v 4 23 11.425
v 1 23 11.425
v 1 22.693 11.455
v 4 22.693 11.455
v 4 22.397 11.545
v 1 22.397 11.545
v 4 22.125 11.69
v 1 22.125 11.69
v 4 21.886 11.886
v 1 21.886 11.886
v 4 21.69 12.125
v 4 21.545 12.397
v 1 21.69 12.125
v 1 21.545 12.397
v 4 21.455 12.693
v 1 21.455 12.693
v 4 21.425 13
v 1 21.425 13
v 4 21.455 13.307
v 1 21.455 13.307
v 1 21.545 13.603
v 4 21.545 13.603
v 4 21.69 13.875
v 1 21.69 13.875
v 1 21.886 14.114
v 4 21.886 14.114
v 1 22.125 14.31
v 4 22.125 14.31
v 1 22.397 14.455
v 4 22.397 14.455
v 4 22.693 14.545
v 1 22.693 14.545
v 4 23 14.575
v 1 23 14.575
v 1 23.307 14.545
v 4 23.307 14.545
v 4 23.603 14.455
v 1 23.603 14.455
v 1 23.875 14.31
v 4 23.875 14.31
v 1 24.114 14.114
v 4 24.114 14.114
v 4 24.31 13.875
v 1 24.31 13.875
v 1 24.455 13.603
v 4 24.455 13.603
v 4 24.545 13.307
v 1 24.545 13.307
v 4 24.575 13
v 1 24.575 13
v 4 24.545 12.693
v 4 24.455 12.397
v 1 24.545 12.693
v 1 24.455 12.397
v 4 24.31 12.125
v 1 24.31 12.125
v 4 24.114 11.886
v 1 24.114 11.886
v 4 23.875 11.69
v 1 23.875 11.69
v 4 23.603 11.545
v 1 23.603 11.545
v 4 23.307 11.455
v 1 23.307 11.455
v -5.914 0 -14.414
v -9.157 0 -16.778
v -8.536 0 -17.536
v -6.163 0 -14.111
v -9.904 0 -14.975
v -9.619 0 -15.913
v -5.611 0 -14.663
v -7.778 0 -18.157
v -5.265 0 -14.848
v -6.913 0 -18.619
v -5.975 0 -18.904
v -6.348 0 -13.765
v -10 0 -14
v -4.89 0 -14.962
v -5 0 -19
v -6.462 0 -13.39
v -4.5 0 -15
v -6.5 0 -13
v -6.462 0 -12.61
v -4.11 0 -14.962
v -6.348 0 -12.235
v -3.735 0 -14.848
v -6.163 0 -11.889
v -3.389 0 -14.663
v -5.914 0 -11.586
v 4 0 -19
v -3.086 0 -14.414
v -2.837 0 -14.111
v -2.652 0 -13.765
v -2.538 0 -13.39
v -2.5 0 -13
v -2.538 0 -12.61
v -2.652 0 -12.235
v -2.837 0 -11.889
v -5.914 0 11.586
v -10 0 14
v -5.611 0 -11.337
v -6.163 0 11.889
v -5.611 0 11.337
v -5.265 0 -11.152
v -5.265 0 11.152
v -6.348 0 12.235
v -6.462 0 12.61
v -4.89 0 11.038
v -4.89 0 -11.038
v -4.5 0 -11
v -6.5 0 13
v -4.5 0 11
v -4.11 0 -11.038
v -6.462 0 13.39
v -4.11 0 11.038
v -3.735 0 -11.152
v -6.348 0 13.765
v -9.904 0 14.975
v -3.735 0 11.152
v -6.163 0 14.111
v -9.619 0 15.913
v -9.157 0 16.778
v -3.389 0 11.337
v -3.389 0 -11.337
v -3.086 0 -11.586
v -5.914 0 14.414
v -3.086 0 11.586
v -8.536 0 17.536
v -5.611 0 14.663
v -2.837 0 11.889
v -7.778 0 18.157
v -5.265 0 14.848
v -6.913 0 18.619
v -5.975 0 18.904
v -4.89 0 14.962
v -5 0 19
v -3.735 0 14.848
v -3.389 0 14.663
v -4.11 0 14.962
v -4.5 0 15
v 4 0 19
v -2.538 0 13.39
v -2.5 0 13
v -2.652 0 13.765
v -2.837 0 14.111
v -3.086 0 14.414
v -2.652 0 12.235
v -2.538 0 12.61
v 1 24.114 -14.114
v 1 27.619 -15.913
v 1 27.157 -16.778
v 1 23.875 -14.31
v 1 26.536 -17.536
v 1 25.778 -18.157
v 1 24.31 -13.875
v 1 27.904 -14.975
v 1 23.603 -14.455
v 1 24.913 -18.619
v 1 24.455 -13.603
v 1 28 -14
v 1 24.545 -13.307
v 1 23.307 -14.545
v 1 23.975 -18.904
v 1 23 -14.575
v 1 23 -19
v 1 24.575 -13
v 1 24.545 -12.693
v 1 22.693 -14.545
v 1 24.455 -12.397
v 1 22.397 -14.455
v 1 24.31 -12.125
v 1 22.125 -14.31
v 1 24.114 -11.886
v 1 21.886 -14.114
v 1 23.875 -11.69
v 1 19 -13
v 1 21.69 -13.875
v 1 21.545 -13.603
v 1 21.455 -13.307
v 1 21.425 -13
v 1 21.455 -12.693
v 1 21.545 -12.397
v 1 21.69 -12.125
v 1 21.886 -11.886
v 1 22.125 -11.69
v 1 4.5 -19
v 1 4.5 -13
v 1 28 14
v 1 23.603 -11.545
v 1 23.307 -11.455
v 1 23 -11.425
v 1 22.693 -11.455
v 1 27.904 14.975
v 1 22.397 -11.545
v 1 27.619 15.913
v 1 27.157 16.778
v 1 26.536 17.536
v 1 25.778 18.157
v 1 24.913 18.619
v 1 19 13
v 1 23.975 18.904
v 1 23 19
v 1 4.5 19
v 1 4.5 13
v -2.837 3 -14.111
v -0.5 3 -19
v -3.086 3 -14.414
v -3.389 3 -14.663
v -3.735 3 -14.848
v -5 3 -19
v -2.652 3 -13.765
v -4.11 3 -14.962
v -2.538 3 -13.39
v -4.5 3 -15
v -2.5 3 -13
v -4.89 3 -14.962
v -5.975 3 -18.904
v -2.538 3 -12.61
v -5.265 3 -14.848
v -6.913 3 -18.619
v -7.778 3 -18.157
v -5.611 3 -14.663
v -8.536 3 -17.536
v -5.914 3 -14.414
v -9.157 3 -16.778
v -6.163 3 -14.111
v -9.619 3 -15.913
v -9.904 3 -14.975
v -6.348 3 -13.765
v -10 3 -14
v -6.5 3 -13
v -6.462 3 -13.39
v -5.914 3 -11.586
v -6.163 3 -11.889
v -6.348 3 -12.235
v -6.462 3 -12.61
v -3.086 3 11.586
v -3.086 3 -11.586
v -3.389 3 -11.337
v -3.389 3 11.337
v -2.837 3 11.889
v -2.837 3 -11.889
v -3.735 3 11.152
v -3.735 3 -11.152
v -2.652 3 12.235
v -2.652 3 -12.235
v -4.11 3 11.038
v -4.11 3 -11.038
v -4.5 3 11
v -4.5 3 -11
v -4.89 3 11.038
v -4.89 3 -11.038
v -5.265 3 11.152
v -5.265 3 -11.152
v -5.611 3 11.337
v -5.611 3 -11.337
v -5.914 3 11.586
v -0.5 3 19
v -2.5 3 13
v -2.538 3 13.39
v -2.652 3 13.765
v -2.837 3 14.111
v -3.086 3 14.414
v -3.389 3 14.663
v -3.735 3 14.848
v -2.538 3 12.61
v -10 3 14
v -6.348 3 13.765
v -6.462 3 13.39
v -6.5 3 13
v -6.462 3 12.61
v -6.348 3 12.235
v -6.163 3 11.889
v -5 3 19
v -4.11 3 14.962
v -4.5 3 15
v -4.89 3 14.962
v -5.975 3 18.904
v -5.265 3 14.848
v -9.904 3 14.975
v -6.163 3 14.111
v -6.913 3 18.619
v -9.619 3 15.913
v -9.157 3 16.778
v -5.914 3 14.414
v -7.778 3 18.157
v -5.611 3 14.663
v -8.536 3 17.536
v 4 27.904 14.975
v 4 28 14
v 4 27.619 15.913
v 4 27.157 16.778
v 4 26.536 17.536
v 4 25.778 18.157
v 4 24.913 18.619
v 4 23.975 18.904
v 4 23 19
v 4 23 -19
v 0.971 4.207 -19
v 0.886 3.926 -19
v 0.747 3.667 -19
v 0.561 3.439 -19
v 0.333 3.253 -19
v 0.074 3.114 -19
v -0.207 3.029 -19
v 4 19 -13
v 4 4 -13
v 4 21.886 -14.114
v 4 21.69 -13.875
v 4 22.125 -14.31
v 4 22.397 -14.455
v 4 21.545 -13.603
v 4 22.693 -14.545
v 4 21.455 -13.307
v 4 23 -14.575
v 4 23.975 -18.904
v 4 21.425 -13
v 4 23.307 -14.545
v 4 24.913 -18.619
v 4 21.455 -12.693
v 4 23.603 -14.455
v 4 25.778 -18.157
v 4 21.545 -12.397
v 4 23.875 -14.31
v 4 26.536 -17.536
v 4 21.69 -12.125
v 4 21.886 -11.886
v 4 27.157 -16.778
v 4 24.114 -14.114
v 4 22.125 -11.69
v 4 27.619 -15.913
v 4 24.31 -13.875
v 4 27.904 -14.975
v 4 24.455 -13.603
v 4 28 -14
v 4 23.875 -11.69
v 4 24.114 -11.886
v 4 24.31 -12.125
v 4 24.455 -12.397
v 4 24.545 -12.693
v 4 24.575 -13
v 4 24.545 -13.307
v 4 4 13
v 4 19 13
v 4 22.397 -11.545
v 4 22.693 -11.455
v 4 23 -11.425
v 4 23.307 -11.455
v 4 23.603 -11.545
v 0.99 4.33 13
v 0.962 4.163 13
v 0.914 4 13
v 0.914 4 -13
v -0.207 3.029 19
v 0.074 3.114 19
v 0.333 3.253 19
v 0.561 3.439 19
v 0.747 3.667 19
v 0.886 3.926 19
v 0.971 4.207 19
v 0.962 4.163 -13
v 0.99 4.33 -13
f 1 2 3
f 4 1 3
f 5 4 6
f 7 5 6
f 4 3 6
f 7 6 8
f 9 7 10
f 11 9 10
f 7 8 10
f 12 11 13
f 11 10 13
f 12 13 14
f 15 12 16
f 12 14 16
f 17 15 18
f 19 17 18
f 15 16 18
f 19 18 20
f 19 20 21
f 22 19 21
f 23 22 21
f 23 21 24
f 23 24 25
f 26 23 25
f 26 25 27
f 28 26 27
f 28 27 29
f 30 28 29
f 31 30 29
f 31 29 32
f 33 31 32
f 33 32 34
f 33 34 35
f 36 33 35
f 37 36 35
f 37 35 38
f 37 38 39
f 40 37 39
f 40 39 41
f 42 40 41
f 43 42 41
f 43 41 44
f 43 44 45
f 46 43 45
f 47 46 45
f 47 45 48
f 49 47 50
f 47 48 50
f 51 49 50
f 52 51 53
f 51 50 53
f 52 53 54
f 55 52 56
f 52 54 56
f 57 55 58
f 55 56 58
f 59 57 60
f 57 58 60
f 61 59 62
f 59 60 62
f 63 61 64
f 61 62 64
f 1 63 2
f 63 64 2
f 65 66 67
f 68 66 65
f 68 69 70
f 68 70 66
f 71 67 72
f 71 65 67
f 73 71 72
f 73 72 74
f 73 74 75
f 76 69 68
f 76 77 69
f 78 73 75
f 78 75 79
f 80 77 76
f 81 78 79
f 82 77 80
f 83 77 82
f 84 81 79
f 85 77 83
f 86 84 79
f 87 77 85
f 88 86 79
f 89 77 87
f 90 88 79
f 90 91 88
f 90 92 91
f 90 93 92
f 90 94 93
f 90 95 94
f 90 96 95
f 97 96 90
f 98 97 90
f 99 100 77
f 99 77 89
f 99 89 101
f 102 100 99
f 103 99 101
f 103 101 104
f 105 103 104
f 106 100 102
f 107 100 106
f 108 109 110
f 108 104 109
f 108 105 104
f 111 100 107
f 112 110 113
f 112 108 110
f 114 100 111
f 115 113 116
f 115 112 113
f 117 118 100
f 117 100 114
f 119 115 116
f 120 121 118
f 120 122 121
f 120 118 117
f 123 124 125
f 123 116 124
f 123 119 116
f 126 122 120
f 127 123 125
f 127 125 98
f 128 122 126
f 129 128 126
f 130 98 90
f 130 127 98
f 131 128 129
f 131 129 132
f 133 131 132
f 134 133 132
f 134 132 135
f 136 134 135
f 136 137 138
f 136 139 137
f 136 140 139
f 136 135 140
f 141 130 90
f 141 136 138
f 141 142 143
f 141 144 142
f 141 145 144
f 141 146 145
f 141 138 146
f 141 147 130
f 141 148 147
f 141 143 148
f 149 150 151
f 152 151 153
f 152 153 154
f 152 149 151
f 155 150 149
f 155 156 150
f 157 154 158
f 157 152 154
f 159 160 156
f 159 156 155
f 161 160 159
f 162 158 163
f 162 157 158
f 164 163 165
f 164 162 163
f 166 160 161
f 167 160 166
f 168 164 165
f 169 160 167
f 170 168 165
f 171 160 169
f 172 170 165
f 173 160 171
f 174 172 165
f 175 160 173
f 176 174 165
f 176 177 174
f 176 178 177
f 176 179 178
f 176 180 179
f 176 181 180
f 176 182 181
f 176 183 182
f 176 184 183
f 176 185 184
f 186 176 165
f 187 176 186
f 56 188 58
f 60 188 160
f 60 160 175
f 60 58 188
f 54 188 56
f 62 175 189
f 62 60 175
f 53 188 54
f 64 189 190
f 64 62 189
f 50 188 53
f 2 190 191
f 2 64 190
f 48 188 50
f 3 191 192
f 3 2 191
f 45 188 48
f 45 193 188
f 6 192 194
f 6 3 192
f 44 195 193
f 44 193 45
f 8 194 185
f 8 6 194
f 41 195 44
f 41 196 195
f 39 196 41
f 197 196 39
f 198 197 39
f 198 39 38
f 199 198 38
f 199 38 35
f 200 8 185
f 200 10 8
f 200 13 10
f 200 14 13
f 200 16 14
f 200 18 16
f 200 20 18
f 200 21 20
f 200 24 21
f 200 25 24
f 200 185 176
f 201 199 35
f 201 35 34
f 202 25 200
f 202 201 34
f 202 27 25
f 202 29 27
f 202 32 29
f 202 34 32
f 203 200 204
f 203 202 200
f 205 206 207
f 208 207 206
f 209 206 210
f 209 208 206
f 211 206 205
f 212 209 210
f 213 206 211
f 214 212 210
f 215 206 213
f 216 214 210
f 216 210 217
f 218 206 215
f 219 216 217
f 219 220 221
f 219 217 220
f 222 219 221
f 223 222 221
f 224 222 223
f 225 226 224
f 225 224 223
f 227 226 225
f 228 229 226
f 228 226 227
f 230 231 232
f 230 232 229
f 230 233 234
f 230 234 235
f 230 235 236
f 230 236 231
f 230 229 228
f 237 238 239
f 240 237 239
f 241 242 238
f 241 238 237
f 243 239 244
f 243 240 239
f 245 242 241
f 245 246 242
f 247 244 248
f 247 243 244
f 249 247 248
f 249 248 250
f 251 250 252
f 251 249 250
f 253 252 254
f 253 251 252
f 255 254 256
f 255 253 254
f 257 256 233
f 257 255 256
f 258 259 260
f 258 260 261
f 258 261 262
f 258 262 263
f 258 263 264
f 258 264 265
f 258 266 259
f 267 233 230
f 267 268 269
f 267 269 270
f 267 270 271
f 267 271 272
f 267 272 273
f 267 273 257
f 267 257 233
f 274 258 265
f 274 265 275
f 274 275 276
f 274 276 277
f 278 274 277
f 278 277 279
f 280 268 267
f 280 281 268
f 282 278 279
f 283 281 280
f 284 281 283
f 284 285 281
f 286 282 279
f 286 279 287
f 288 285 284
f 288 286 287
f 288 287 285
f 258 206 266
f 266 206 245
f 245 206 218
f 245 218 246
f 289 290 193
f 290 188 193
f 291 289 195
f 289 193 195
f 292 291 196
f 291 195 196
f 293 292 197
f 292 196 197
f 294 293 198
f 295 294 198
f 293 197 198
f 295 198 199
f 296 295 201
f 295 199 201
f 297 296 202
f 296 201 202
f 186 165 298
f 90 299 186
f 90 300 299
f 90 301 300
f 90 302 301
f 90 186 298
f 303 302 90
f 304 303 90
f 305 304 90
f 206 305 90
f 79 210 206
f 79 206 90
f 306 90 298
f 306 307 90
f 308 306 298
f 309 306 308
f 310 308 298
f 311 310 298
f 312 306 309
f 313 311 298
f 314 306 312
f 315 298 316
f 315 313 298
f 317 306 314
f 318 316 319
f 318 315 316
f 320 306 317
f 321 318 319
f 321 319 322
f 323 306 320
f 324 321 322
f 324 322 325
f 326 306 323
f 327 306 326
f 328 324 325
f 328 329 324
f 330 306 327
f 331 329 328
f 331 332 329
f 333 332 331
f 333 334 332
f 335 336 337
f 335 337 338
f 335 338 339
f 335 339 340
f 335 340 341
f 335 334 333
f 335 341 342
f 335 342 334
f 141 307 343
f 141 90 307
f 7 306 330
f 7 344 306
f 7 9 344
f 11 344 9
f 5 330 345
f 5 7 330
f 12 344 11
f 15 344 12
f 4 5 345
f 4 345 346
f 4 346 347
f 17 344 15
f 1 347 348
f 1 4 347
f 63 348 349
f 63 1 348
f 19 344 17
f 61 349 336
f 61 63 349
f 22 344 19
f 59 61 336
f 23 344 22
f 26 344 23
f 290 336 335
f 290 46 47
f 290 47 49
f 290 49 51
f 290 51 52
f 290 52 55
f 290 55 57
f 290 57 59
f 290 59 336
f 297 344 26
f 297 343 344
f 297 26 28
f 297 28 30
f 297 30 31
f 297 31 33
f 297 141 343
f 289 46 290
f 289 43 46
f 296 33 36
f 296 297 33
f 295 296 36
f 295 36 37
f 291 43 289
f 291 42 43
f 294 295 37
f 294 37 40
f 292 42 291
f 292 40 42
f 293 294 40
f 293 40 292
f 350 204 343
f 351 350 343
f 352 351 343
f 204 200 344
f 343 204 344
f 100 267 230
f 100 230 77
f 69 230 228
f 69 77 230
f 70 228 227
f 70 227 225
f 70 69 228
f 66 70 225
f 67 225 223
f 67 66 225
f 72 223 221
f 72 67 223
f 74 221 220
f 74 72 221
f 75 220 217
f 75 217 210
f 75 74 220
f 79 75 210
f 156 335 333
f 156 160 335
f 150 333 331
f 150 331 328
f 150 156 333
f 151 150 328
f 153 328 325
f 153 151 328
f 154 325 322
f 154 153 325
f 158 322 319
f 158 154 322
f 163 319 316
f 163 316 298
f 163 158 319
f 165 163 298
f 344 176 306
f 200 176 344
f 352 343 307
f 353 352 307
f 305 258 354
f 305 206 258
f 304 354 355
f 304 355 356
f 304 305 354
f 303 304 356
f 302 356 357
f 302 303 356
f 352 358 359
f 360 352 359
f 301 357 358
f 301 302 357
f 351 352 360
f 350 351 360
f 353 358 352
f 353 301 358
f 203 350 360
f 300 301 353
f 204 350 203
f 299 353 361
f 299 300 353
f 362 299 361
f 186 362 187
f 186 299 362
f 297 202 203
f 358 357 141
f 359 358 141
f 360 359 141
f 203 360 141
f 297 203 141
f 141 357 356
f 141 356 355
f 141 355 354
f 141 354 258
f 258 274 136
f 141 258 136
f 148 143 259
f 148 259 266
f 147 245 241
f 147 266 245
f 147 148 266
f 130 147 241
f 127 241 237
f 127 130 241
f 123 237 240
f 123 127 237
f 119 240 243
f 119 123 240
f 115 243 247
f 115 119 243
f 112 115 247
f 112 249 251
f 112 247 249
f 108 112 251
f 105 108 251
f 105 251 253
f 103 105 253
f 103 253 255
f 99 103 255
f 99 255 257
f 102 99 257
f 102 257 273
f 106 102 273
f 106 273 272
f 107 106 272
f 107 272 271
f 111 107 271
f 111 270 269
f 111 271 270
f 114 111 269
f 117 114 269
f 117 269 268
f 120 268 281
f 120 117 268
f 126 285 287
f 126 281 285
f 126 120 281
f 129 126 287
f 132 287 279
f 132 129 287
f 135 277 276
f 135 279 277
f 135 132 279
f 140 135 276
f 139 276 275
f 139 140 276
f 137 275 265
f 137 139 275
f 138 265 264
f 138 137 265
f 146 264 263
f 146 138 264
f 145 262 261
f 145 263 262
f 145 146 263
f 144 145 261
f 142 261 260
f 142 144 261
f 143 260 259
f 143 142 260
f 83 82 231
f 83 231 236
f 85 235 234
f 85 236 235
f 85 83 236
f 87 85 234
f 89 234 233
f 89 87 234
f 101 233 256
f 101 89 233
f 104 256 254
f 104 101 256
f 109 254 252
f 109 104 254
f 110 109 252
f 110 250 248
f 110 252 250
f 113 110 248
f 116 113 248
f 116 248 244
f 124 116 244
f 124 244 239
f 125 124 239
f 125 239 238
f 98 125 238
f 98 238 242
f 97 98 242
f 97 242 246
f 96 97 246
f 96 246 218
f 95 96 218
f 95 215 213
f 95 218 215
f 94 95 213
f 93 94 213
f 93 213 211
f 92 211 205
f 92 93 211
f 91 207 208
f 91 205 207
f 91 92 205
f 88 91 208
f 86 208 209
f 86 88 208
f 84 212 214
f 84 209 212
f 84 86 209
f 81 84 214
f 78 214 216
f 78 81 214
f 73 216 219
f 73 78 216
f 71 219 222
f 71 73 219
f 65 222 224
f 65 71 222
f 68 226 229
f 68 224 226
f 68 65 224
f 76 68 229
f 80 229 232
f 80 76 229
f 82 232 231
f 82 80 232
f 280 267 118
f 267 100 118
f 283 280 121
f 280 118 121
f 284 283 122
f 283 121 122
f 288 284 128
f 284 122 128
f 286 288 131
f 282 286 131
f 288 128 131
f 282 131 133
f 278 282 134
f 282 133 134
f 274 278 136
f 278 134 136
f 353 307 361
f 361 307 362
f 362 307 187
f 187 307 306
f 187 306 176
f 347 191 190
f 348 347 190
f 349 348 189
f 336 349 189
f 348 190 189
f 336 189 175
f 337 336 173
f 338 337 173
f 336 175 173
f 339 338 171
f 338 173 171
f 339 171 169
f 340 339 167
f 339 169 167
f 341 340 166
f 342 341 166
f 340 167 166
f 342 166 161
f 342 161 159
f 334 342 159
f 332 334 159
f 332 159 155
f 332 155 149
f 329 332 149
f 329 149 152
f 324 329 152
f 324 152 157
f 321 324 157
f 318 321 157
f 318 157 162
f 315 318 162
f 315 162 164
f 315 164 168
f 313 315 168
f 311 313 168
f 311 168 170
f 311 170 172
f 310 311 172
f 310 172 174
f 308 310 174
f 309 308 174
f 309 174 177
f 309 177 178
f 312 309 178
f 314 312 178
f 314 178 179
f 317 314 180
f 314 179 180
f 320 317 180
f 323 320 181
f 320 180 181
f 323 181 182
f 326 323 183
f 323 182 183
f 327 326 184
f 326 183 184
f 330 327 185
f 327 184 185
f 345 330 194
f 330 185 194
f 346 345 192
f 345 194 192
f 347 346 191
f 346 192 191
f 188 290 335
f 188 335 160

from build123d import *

# Parameters (mm, degrees)
BOSS_EXTRUDE1_DEPTH     = 19
CUT_EXTRUDE1_DEPTH      = 33.954514107
CUT_EXTRUDE1_DEPTH_BACK = 33.954514107
SKETCH2_R               = 2
SKETCH3_R               = 1.575
SKETCH3_W               = 26
SKETCH3_H               = 15
CUT_EXTRUDE2_DEPTH      = 36.580893749
FILLET1_R               = 1.5
FILLET2_R               = 5


with BuildPart() as part:
    # Sketch1 → Boss-Extrude1 (new, symmetric)
    with BuildSketch(Plane.XY):
        Polygon((0, 0), (4, 0), (4, 28), (1, 28), (1, 3), (-10, 3), (-10, 0), align=None)
    extrude(amount=BOSS_EXTRUDE1_DEPTH, both=True)

    # Sketch2 → Cut-Extrude1 (cut, two sides: drawn at the far end of the back side and taken through both)
    with BuildSketch(Plane(origin=(0, 3, 0), x_dir=(1, 0, 0), z_dir=(0, 1, 0)).offset(-CUT_EXTRUDE1_DEPTH_BACK)):
        with Locations(Location((-4.5, 13, 0), (0, 0, 180))):
            Circle(SKETCH2_R)
        with Locations((-4.5, -13)):
            Circle(SKETCH2_R)
    extrude(amount=CUT_EXTRUDE1_DEPTH + CUT_EXTRUDE1_DEPTH_BACK, mode=Mode.SUBTRACT)

    # Sketch3 → Cut-Extrude2 (cut, through all)
    with BuildSketch(Plane.ZY.offset(-1)):
        with Locations((-13, 23)):
            Circle(SKETCH3_R)
        with Locations(Location((13, 23, 0), (0, 0, 180))):
            Circle(SKETCH3_R)
        with Locations((0, 11.5)):
            Rectangle(SKETCH3_W, SKETCH3_H)
    extrude(amount=-CUT_EXTRUDE2_DEPTH, mode=Mode.SUBTRACT)

    # Fillet1
    # the kernel refuses this fillet: 1.5 mm, written as the material it adds along each edge
    with BuildSketch(Plane(origin=(1, 3, -19), x_dir=(0, 1, 0), z_dir=(0, 0, 1))) as fillet1_piece_1_section:
        with BuildLine():
            CenterArc((FILLET1_R, FILLET1_R), FILLET1_R, 180, 90)
            Line((0, FILLET1_R), (0, 0))
            Line((0, 0), (FILLET1_R, 0))
        make_face()
    fillet1_piece_1 = extrude(amount=38, mode=Mode.PRIVATE)
    fillet1_piece_1 = split(fillet1_piece_1, bisect_by=Plane(origin=(0.995303959, 4, -16), z_dir=(0, 1, 0)), keep=Keep.TOP, mode=Mode.PRIVATE)
    fillet1_piece_1 = split(fillet1_piece_1, bisect_by=Plane(origin=(0.995303959, 4.189014255, -13), z_dir=(0, 0, -1)), keep=Keep.TOP, mode=Mode.PRIVATE)
    add(fillet1_piece_1)
    with BuildSketch(Plane(origin=(1, 3, -19), x_dir=(0, 1, 0), z_dir=(0, 0, 1))) as fillet1_piece_2_section:
        with BuildLine():
            CenterArc((FILLET1_R, FILLET1_R), FILLET1_R, 180, 90)
            Line((0, FILLET1_R), (0, 0))
            Line((0, 0), (FILLET1_R, 0))
        make_face()
    fillet1_piece_2 = extrude(amount=38, mode=Mode.PRIVATE)
    fillet1_piece_2 = split(fillet1_piece_2, bisect_by=Plane(origin=(0.642494848, 4, -16), z_dir=(0, -1, 0)), keep=Keep.TOP, mode=Mode.PRIVATE)
    fillet1_piece_2 = split(fillet1_piece_2, bisect_by=Plane(origin=(0.642494848, 3.294160002, -13), z_dir=(0, 0, -1)), keep=Keep.TOP, mode=Mode.PRIVATE)
    add(fillet1_piece_2)
    with BuildSketch(Plane(origin=(1, 3, -19), x_dir=(0, 1, 0), z_dir=(0, 0, 1))) as fillet1_piece_3_section:
        with BuildLine():
            CenterArc((FILLET1_R, FILLET1_R), FILLET1_R, 180, 90)
            Line((0, FILLET1_R), (0, 0))
            Line((0, 0), (FILLET1_R, 0))
        make_face()
    fillet1_piece_3 = extrude(amount=38, mode=Mode.PRIVATE)
    fillet1_piece_3 = split(fillet1_piece_3, bisect_by=Plane(origin=(0.642494848, 4, 0), z_dir=(0, -1, 0)), keep=Keep.TOP, mode=Mode.PRIVATE)
    fillet1_piece_3 = split(fillet1_piece_3, bisect_by=Plane(origin=(0.642494848, 3.294160002, -13), z_dir=(0, 0, 1)), keep=Keep.TOP, mode=Mode.PRIVATE)
    fillet1_piece_3 = split(fillet1_piece_3, bisect_by=Plane(origin=(0.642494848, 3.294160002, 13), z_dir=(0, 0, -1)), keep=Keep.TOP, mode=Mode.PRIVATE)
    add(fillet1_piece_3)
    with BuildSketch(Plane(origin=(1, 3, -19), x_dir=(0, 1, 0), z_dir=(0, 0, 1))) as fillet1_piece_4_section:
        with BuildLine():
            CenterArc((FILLET1_R, FILLET1_R), FILLET1_R, 180, 90)
            Line((0, FILLET1_R), (0, 0))
            Line((0, 0), (FILLET1_R, 0))
        make_face()
    fillet1_piece_4 = extrude(amount=38, mode=Mode.PRIVATE)
    fillet1_piece_4 = split(fillet1_piece_4, bisect_by=Plane(origin=(0.995303959, 4, 16), z_dir=(0, 1, 0)), keep=Keep.TOP, mode=Mode.PRIVATE)
    fillet1_piece_4 = split(fillet1_piece_4, bisect_by=Plane(origin=(0.995303959, 4.189014255, 13), z_dir=(0, 0, 1)), keep=Keep.TOP, mode=Mode.PRIVATE)
    add(fillet1_piece_4)
    with BuildSketch(Plane(origin=(1, 3, -19), x_dir=(0, 1, 0), z_dir=(0, 0, 1))) as fillet1_piece_5_section:
        with BuildLine():
            CenterArc((FILLET1_R, FILLET1_R), FILLET1_R, 180, 90)
            Line((0, FILLET1_R), (0, 0))
            Line((0, 0), (FILLET1_R, 0))
        make_face()
    fillet1_piece_5 = extrude(amount=38, mode=Mode.PRIVATE)
    fillet1_piece_5 = split(fillet1_piece_5, bisect_by=Plane(origin=(0.642494848, 4, 16), z_dir=(0, -1, 0)), keep=Keep.TOP, mode=Mode.PRIVATE)
    fillet1_piece_5 = split(fillet1_piece_5, bisect_by=Plane(origin=(0.642494848, 3.294160002, 13), z_dir=(0, 0, 1)), keep=Keep.TOP, mode=Mode.PRIVATE)
    add(fillet1_piece_5)

    # Fillet2
    fillet2_edges = [part.edges().sort_by_distance(p)[0] for p in [
        (2.5, 28, 19),
        (-10, 1.5, 19),
        (-10, 1.5, -19),
        (2.5, 28, -19),
    ]]
    fillet(fillet2_edges, radius=FILLET2_R)


solid = part.part
